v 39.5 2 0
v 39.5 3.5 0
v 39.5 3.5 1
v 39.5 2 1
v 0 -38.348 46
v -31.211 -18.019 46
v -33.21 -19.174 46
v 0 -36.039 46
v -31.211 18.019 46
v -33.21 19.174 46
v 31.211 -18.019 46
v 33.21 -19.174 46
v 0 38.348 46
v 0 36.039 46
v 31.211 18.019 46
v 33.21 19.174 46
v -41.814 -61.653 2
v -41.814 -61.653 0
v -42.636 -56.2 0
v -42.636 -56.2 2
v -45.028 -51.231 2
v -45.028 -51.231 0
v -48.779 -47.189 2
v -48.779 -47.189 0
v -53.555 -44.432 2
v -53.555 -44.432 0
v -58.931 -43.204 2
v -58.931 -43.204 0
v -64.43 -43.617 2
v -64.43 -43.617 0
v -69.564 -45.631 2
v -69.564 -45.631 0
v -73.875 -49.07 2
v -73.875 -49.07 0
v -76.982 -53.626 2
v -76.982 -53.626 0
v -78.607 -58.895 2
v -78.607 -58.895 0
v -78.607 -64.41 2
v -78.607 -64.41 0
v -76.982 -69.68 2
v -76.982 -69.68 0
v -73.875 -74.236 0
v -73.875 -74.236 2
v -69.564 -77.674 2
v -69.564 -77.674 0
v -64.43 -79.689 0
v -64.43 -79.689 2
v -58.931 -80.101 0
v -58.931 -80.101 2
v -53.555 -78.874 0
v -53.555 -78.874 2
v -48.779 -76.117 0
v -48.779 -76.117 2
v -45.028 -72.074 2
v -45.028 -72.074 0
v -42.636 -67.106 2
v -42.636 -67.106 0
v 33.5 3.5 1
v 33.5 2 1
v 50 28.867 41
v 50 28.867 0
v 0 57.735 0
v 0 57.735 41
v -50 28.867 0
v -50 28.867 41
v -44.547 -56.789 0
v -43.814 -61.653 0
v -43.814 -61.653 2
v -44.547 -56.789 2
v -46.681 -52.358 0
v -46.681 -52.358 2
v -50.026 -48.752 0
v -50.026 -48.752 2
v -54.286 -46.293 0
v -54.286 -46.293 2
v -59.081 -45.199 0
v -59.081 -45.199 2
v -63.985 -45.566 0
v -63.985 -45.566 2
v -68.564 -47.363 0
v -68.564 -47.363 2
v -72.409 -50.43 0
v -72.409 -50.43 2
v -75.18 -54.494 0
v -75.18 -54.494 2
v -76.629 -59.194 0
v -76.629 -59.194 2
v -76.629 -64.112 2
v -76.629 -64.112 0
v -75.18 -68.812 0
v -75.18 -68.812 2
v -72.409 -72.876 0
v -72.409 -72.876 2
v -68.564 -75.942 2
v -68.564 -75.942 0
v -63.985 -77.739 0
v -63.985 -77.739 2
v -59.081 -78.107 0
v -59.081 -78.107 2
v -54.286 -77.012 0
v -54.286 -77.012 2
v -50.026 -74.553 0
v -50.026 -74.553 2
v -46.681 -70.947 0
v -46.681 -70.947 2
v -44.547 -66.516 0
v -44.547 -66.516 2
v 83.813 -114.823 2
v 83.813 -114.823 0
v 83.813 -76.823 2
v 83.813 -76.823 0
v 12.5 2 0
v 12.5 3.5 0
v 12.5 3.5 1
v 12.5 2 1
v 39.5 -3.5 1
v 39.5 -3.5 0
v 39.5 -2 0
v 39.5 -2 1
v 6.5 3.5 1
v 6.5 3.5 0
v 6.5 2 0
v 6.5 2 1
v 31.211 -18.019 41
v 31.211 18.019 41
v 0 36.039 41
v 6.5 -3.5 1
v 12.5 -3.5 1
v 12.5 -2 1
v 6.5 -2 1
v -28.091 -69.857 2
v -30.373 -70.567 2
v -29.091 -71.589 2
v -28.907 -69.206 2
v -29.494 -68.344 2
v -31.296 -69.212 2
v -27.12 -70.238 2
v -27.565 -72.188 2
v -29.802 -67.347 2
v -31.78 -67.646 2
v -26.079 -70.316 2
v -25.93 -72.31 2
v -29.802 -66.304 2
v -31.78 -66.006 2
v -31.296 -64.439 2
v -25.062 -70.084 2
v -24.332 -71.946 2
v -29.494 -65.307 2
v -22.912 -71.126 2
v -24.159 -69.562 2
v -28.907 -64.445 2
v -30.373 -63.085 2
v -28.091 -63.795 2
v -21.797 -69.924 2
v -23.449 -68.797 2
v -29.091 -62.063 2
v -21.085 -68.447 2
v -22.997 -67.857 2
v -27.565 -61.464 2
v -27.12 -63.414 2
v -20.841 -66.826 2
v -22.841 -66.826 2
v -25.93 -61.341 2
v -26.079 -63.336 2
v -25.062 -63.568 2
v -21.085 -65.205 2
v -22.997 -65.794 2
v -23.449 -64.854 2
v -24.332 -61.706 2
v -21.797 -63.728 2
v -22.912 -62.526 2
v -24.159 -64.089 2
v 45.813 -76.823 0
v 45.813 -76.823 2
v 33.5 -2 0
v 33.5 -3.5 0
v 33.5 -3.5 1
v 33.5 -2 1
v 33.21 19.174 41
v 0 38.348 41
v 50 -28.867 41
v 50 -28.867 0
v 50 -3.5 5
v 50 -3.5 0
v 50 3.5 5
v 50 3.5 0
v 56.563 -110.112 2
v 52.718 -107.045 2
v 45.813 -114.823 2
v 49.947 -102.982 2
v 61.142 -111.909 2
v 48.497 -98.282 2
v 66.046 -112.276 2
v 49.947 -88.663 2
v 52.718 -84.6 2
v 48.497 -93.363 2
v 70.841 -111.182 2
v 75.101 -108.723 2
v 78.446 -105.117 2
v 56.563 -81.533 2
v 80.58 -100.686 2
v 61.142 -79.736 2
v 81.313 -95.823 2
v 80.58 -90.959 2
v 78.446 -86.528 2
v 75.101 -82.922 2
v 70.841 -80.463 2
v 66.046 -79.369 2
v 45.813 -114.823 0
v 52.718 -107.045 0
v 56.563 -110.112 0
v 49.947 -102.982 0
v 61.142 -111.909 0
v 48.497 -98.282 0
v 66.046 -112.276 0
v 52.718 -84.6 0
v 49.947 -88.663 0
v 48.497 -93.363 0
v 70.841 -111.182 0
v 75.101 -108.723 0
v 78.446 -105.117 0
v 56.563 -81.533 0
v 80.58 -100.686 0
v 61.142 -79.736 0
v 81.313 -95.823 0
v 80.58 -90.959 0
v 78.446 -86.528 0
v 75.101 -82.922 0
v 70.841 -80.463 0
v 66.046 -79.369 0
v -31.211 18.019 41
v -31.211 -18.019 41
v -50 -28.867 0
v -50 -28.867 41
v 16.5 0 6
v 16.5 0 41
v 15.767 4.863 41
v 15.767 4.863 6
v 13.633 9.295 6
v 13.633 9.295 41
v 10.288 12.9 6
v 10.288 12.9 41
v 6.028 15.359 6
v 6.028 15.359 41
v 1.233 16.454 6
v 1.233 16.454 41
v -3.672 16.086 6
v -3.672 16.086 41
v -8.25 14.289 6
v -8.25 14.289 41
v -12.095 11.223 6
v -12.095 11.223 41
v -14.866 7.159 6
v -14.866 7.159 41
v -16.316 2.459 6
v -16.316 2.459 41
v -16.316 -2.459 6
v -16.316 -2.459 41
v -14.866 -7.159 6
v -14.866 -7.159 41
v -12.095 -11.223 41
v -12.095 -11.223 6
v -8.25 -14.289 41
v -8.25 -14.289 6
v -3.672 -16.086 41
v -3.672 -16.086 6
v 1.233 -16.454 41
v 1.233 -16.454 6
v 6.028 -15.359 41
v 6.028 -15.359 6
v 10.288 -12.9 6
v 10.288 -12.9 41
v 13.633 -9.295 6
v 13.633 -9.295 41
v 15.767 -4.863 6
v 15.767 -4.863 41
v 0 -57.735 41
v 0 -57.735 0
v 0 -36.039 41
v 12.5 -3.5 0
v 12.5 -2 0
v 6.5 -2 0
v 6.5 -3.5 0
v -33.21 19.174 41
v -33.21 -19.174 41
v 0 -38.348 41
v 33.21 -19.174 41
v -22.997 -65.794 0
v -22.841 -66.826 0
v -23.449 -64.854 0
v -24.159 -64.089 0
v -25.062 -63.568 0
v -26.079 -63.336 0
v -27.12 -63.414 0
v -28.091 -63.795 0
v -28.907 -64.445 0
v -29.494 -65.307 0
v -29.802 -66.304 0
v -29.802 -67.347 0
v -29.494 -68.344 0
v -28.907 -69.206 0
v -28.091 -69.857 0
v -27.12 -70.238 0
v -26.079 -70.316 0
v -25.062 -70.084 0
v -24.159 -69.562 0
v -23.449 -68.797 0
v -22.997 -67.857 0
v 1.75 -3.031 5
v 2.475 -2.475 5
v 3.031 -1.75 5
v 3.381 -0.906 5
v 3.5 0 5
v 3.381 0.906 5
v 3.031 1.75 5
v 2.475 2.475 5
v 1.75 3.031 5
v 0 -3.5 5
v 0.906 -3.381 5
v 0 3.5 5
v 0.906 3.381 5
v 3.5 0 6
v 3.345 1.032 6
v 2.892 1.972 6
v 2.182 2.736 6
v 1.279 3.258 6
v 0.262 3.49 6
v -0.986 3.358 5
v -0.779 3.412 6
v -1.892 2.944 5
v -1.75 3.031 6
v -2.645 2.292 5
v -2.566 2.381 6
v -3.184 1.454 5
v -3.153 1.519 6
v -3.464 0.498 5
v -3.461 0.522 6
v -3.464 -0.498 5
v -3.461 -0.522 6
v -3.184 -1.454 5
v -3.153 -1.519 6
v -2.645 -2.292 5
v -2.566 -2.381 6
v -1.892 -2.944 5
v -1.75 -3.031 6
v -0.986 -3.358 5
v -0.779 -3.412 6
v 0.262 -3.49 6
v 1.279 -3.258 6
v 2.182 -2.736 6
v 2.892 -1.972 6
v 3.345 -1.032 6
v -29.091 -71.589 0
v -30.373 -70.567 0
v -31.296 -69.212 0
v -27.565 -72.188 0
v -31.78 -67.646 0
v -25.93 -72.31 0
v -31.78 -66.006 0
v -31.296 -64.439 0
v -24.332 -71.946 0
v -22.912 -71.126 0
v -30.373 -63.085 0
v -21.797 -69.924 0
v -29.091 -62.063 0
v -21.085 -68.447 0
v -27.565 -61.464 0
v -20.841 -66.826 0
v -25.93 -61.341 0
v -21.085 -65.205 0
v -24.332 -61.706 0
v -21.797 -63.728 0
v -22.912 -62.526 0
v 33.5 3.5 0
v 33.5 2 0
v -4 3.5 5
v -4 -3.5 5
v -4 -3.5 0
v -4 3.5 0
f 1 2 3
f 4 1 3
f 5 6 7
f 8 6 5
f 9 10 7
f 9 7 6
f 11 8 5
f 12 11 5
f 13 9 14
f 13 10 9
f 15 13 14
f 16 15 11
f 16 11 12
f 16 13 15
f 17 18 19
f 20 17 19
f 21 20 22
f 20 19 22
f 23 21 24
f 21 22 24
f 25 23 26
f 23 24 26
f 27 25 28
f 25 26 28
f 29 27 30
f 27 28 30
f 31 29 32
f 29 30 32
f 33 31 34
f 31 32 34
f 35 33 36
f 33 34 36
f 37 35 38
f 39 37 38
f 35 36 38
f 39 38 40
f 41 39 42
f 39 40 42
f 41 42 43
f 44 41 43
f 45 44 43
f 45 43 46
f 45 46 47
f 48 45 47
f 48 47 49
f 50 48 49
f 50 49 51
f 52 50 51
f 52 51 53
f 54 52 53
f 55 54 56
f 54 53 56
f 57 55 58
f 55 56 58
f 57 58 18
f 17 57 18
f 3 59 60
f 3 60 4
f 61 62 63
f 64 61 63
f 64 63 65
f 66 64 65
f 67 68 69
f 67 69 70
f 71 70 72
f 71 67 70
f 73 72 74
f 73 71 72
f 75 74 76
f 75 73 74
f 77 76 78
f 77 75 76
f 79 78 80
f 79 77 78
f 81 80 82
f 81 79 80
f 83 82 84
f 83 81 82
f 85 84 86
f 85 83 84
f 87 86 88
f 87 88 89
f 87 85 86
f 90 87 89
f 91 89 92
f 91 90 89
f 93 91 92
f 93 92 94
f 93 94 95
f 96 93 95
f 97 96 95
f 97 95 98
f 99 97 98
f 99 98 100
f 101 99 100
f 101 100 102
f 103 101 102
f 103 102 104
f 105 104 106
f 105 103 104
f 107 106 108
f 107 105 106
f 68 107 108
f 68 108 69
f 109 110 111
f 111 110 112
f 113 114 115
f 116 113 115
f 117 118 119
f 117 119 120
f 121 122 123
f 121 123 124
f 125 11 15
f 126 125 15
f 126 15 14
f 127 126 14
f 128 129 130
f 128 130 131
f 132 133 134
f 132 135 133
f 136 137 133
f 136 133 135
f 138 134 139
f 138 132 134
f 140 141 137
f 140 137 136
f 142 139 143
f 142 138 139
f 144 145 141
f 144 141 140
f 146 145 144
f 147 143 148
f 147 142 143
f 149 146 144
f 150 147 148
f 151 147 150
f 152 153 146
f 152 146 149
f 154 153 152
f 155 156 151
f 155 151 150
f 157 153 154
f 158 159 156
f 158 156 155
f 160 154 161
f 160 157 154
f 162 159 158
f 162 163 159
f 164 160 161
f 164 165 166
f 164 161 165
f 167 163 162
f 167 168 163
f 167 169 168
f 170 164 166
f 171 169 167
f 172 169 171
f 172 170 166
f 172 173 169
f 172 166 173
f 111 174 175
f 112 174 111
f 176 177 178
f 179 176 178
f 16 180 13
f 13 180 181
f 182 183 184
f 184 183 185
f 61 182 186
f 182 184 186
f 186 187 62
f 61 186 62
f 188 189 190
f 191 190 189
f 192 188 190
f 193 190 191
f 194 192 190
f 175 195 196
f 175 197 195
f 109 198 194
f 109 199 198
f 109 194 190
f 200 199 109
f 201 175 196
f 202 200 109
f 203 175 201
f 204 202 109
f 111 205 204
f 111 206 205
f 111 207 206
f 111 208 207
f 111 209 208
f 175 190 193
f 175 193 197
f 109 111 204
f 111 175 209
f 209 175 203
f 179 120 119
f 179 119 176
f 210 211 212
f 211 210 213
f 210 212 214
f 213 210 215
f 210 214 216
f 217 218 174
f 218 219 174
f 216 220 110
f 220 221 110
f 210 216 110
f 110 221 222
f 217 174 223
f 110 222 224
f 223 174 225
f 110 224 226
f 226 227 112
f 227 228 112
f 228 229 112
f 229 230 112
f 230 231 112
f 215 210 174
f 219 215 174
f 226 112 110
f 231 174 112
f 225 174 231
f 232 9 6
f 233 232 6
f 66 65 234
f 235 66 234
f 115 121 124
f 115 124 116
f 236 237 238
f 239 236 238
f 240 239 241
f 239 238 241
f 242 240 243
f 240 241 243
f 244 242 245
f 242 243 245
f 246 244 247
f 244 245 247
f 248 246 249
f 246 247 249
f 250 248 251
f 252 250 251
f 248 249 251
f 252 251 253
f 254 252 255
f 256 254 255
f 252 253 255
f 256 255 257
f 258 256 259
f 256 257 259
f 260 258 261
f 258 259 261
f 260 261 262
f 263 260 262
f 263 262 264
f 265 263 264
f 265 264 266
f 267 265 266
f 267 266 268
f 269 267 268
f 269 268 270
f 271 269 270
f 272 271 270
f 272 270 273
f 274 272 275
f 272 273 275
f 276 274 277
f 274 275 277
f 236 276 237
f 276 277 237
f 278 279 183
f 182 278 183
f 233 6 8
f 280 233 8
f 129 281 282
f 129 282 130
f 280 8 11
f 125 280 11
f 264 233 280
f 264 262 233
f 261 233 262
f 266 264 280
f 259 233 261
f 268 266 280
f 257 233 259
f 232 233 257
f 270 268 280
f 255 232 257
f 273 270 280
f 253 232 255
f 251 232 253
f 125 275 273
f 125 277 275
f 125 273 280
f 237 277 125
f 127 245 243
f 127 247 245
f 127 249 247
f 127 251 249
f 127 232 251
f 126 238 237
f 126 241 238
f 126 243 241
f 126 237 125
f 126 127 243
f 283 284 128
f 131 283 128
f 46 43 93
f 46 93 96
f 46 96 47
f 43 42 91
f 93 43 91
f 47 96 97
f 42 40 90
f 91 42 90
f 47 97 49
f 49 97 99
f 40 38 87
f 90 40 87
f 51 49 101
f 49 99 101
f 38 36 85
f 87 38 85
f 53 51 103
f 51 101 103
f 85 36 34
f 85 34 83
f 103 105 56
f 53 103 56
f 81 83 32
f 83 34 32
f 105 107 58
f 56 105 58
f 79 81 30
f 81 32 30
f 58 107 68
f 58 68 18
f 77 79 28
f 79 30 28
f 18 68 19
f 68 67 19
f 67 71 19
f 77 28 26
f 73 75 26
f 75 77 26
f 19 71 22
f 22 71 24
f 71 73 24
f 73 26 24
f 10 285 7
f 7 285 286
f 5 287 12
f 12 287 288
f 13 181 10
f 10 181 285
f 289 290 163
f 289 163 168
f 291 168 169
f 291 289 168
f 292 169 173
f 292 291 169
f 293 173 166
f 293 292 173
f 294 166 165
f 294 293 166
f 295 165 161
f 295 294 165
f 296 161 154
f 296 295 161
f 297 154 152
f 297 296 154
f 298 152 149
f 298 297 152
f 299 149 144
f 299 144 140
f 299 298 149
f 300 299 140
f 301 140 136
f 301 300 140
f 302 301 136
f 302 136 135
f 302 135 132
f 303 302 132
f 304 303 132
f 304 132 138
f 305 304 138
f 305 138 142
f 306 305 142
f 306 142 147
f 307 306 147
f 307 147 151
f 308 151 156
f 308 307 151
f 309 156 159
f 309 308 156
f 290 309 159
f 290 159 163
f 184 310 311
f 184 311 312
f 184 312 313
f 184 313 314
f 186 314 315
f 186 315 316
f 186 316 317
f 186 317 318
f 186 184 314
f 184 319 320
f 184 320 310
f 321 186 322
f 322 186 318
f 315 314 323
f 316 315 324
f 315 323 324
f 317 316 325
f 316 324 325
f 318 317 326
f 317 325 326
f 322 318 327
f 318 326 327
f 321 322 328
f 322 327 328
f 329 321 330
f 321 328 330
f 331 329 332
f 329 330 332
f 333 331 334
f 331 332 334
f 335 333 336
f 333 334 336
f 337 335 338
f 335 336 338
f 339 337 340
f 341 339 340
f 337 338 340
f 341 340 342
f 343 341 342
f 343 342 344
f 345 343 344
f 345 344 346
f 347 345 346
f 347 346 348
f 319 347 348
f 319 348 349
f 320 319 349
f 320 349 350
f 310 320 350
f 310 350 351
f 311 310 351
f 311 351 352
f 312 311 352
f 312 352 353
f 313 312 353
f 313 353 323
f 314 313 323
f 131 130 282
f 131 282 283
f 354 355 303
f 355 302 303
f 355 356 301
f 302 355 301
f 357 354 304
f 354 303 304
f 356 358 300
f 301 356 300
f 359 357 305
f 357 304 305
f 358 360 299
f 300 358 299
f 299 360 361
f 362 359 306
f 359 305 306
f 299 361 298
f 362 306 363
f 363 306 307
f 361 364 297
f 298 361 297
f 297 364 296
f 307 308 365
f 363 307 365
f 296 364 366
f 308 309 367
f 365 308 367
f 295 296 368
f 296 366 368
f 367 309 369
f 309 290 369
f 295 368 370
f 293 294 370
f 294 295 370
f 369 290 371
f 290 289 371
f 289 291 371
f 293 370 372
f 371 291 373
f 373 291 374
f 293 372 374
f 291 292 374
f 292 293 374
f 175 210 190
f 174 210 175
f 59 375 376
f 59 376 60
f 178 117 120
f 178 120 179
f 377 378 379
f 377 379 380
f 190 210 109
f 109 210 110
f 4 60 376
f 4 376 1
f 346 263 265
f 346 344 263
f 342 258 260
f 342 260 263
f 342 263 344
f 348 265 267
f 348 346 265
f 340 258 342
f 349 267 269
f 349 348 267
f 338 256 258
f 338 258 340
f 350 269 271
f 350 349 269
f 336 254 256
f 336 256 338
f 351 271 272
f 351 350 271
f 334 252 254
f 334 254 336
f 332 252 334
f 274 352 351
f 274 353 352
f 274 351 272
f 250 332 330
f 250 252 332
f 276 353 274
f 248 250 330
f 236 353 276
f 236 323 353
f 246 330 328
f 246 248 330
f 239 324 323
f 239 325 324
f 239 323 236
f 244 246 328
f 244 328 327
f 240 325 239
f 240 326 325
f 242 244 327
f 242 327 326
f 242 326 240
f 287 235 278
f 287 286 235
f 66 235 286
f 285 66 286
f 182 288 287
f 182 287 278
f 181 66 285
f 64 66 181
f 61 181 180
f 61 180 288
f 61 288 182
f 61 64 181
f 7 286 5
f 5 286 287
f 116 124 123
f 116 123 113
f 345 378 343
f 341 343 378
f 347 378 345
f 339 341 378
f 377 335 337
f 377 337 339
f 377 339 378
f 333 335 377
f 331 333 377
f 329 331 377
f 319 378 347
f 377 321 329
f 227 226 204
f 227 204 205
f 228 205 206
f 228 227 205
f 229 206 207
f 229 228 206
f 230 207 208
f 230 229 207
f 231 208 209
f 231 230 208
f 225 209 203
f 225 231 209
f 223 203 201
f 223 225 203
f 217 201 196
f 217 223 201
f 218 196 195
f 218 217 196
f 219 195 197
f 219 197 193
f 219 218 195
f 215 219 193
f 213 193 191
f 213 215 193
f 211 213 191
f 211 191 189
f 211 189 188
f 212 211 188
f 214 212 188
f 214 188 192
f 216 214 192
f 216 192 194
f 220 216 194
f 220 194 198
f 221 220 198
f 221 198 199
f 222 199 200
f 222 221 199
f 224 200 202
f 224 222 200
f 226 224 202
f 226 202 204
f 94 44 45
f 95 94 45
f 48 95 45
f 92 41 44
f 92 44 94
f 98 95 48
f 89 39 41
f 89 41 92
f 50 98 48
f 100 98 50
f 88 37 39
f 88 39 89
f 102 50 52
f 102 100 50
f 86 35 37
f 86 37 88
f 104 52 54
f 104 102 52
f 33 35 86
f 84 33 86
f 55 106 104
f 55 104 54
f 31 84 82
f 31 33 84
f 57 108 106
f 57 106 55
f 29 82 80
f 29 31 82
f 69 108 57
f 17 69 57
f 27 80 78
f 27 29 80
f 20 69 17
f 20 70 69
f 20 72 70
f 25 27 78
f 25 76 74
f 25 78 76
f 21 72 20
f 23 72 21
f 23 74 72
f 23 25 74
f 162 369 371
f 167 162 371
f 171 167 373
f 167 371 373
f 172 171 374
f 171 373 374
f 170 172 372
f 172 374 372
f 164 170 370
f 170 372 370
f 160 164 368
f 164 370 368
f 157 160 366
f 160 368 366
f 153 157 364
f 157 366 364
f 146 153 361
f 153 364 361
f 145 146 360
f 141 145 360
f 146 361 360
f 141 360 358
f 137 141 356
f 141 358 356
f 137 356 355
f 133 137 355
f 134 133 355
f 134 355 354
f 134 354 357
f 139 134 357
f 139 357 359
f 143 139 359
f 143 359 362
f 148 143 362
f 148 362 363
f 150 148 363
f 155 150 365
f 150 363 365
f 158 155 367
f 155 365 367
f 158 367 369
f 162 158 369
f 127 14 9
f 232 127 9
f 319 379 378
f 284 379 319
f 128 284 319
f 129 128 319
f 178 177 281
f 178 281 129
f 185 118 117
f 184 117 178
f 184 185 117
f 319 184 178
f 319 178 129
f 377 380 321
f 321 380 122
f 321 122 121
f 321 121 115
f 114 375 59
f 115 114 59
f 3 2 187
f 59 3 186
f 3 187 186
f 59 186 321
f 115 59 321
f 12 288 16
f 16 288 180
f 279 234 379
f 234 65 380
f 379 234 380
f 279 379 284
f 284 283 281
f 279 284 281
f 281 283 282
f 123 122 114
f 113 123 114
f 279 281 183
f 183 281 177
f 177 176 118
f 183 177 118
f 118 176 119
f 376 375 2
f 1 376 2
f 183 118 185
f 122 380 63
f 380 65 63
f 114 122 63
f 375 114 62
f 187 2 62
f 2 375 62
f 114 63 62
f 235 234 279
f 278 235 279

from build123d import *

# Parameters (mm, degrees)
F1_DEPTH  = 41
F3_DEPTH  = 5
F5_DEPTH  = 5
F6_R      = 16.5
F7_DEPTH  = 35
F9_R      = 3.5
F10_DEPTH = 25
F11_W     = 7
F11_H     = 5
F12_DEPTH = 54
F13_W     = 6
F13_H     = 1
F14_DEPTH = 1.5
F15_W     = 6
F15_H     = 1
F16_DEPTH = 1.5
F17_R     = 18.5
F17_R_2   = 16.5
F18_DEPTH = 2
F19_R     = 5.5
F19_R_2   = 3.5
F20_DEPTH = 2
F21_W     = 38
F21_H     = 38
F21_R     = 16.5
F22_DEPTH = 2


with BuildPart() as f1:
    # F0 (on Top) → F1 (new body)
    with BuildSketch(Plane.XY):
        Polygon((49.999933, 28.867475), (0, 57.73495), (-49.999933, 28.867475), (-49.999933, -28.867475), (0, -57.73495), (49.999933, -28.867475), align=None)
    extrude(amount=F1_DEPTH)

    # F2 (on face) → F3 (join)
    with BuildSketch(Plane.XY.offset(41)):
        Polygon((33.210299, 19.173975), (0, 38.34795), (-33.210299, 19.173975), (-33.210299, -19.173975), (0, -38.34795), (33.210299, -19.173975), align=None)
    extrude(amount=F3_DEPTH)

    # F4 (on face) → F5 (cut)
    with BuildSketch(Plane.XY.offset(46)):
        Polygon((31.210525, 18.019405), (0, 36.03881), (-31.210525, 18.019405), (-31.210525, -18.019405), (0, -36.03881), (31.210525, -18.019405), align=None)
    extrude(amount=-F5_DEPTH, mode=Mode.SUBTRACT)

    # F6 (on face) → F7 (cut)
    with BuildSketch(Plane.XY.offset(41)):
        Circle(F6_R)
    extrude(amount=-F7_DEPTH, mode=Mode.SUBTRACT)

    # F9 (on face) → F10 (cut)
    with BuildSketch(Plane.XY.offset(6)):
        Circle(F9_R)
    extrude(amount=-F10_DEPTH, mode=Mode.SUBTRACT)

    # F11 (on face) → F12 (cut)
    with BuildSketch(Plane.YZ.offset(49.999933)):
        with Locations((0, 2.5)):
            Rectangle(F11_W, F11_H)
    extrude(amount=-F12_DEPTH, mode=Mode.SUBTRACT)

    # F13 (on face) → F14 (join)
    with BuildSketch(Plane(origin=(0, -3.5, 0), x_dir=(-1, 0, 0), z_dir=(0, 1, 0))):
        with Locations((-9.499933, 0.5)):
            Rectangle(F13_W, F13_H)
        with Locations((-36.499933, 0.5)):
            Rectangle(F13_W, F13_H)
    extrude(amount=F14_DEPTH)

    # F15 (on face) → F16 (join)
    with BuildSketch(Plane.XZ.offset(-3.5)):
        with Locations((36.499933, 0.5)):
            Rectangle(F15_W, F15_H)
        with Locations((9.499933, 0.5)):
            Rectangle(F15_W, F15_H)
    extrude(amount=F16_DEPTH)


with BuildPart() as f18:
    # F17 (on Top) → F18 (new body)
    with BuildSketch(Plane.XY):
        with Locations((-60.313754, -61.652713)):
            Circle(F17_R)
        with Locations((-60.313754, -61.652713)):
            Circle(F17_R_2, mode=Mode.SUBTRACT)
    extrude(amount=F18_DEPTH)


with BuildPart() as f20:
    # F19 (on Top) → F20 (new body)
    with BuildSketch(Plane.XY):
        with Locations((-26.341047, -66.82577)):
            Circle(F19_R)
        with Locations((-26.341047, -66.82577)):
            Circle(F19_R_2, mode=Mode.SUBTRACT)
    extrude(amount=F20_DEPTH)


with BuildPart() as f22:
    # F21 (on Top) → F22 (new body)
    with BuildSketch(Plane.XY):
        with Locations((64.813106, -95.822567)):
            Rectangle(F21_W, F21_H)
        with Locations((64.813106, -95.822567)):
            Circle(F21_R, mode=Mode.SUBTRACT)
    extrude(amount=F22_DEPTH)


solid = Compound([f1.part, f18.part, f20.part, f22.part])
